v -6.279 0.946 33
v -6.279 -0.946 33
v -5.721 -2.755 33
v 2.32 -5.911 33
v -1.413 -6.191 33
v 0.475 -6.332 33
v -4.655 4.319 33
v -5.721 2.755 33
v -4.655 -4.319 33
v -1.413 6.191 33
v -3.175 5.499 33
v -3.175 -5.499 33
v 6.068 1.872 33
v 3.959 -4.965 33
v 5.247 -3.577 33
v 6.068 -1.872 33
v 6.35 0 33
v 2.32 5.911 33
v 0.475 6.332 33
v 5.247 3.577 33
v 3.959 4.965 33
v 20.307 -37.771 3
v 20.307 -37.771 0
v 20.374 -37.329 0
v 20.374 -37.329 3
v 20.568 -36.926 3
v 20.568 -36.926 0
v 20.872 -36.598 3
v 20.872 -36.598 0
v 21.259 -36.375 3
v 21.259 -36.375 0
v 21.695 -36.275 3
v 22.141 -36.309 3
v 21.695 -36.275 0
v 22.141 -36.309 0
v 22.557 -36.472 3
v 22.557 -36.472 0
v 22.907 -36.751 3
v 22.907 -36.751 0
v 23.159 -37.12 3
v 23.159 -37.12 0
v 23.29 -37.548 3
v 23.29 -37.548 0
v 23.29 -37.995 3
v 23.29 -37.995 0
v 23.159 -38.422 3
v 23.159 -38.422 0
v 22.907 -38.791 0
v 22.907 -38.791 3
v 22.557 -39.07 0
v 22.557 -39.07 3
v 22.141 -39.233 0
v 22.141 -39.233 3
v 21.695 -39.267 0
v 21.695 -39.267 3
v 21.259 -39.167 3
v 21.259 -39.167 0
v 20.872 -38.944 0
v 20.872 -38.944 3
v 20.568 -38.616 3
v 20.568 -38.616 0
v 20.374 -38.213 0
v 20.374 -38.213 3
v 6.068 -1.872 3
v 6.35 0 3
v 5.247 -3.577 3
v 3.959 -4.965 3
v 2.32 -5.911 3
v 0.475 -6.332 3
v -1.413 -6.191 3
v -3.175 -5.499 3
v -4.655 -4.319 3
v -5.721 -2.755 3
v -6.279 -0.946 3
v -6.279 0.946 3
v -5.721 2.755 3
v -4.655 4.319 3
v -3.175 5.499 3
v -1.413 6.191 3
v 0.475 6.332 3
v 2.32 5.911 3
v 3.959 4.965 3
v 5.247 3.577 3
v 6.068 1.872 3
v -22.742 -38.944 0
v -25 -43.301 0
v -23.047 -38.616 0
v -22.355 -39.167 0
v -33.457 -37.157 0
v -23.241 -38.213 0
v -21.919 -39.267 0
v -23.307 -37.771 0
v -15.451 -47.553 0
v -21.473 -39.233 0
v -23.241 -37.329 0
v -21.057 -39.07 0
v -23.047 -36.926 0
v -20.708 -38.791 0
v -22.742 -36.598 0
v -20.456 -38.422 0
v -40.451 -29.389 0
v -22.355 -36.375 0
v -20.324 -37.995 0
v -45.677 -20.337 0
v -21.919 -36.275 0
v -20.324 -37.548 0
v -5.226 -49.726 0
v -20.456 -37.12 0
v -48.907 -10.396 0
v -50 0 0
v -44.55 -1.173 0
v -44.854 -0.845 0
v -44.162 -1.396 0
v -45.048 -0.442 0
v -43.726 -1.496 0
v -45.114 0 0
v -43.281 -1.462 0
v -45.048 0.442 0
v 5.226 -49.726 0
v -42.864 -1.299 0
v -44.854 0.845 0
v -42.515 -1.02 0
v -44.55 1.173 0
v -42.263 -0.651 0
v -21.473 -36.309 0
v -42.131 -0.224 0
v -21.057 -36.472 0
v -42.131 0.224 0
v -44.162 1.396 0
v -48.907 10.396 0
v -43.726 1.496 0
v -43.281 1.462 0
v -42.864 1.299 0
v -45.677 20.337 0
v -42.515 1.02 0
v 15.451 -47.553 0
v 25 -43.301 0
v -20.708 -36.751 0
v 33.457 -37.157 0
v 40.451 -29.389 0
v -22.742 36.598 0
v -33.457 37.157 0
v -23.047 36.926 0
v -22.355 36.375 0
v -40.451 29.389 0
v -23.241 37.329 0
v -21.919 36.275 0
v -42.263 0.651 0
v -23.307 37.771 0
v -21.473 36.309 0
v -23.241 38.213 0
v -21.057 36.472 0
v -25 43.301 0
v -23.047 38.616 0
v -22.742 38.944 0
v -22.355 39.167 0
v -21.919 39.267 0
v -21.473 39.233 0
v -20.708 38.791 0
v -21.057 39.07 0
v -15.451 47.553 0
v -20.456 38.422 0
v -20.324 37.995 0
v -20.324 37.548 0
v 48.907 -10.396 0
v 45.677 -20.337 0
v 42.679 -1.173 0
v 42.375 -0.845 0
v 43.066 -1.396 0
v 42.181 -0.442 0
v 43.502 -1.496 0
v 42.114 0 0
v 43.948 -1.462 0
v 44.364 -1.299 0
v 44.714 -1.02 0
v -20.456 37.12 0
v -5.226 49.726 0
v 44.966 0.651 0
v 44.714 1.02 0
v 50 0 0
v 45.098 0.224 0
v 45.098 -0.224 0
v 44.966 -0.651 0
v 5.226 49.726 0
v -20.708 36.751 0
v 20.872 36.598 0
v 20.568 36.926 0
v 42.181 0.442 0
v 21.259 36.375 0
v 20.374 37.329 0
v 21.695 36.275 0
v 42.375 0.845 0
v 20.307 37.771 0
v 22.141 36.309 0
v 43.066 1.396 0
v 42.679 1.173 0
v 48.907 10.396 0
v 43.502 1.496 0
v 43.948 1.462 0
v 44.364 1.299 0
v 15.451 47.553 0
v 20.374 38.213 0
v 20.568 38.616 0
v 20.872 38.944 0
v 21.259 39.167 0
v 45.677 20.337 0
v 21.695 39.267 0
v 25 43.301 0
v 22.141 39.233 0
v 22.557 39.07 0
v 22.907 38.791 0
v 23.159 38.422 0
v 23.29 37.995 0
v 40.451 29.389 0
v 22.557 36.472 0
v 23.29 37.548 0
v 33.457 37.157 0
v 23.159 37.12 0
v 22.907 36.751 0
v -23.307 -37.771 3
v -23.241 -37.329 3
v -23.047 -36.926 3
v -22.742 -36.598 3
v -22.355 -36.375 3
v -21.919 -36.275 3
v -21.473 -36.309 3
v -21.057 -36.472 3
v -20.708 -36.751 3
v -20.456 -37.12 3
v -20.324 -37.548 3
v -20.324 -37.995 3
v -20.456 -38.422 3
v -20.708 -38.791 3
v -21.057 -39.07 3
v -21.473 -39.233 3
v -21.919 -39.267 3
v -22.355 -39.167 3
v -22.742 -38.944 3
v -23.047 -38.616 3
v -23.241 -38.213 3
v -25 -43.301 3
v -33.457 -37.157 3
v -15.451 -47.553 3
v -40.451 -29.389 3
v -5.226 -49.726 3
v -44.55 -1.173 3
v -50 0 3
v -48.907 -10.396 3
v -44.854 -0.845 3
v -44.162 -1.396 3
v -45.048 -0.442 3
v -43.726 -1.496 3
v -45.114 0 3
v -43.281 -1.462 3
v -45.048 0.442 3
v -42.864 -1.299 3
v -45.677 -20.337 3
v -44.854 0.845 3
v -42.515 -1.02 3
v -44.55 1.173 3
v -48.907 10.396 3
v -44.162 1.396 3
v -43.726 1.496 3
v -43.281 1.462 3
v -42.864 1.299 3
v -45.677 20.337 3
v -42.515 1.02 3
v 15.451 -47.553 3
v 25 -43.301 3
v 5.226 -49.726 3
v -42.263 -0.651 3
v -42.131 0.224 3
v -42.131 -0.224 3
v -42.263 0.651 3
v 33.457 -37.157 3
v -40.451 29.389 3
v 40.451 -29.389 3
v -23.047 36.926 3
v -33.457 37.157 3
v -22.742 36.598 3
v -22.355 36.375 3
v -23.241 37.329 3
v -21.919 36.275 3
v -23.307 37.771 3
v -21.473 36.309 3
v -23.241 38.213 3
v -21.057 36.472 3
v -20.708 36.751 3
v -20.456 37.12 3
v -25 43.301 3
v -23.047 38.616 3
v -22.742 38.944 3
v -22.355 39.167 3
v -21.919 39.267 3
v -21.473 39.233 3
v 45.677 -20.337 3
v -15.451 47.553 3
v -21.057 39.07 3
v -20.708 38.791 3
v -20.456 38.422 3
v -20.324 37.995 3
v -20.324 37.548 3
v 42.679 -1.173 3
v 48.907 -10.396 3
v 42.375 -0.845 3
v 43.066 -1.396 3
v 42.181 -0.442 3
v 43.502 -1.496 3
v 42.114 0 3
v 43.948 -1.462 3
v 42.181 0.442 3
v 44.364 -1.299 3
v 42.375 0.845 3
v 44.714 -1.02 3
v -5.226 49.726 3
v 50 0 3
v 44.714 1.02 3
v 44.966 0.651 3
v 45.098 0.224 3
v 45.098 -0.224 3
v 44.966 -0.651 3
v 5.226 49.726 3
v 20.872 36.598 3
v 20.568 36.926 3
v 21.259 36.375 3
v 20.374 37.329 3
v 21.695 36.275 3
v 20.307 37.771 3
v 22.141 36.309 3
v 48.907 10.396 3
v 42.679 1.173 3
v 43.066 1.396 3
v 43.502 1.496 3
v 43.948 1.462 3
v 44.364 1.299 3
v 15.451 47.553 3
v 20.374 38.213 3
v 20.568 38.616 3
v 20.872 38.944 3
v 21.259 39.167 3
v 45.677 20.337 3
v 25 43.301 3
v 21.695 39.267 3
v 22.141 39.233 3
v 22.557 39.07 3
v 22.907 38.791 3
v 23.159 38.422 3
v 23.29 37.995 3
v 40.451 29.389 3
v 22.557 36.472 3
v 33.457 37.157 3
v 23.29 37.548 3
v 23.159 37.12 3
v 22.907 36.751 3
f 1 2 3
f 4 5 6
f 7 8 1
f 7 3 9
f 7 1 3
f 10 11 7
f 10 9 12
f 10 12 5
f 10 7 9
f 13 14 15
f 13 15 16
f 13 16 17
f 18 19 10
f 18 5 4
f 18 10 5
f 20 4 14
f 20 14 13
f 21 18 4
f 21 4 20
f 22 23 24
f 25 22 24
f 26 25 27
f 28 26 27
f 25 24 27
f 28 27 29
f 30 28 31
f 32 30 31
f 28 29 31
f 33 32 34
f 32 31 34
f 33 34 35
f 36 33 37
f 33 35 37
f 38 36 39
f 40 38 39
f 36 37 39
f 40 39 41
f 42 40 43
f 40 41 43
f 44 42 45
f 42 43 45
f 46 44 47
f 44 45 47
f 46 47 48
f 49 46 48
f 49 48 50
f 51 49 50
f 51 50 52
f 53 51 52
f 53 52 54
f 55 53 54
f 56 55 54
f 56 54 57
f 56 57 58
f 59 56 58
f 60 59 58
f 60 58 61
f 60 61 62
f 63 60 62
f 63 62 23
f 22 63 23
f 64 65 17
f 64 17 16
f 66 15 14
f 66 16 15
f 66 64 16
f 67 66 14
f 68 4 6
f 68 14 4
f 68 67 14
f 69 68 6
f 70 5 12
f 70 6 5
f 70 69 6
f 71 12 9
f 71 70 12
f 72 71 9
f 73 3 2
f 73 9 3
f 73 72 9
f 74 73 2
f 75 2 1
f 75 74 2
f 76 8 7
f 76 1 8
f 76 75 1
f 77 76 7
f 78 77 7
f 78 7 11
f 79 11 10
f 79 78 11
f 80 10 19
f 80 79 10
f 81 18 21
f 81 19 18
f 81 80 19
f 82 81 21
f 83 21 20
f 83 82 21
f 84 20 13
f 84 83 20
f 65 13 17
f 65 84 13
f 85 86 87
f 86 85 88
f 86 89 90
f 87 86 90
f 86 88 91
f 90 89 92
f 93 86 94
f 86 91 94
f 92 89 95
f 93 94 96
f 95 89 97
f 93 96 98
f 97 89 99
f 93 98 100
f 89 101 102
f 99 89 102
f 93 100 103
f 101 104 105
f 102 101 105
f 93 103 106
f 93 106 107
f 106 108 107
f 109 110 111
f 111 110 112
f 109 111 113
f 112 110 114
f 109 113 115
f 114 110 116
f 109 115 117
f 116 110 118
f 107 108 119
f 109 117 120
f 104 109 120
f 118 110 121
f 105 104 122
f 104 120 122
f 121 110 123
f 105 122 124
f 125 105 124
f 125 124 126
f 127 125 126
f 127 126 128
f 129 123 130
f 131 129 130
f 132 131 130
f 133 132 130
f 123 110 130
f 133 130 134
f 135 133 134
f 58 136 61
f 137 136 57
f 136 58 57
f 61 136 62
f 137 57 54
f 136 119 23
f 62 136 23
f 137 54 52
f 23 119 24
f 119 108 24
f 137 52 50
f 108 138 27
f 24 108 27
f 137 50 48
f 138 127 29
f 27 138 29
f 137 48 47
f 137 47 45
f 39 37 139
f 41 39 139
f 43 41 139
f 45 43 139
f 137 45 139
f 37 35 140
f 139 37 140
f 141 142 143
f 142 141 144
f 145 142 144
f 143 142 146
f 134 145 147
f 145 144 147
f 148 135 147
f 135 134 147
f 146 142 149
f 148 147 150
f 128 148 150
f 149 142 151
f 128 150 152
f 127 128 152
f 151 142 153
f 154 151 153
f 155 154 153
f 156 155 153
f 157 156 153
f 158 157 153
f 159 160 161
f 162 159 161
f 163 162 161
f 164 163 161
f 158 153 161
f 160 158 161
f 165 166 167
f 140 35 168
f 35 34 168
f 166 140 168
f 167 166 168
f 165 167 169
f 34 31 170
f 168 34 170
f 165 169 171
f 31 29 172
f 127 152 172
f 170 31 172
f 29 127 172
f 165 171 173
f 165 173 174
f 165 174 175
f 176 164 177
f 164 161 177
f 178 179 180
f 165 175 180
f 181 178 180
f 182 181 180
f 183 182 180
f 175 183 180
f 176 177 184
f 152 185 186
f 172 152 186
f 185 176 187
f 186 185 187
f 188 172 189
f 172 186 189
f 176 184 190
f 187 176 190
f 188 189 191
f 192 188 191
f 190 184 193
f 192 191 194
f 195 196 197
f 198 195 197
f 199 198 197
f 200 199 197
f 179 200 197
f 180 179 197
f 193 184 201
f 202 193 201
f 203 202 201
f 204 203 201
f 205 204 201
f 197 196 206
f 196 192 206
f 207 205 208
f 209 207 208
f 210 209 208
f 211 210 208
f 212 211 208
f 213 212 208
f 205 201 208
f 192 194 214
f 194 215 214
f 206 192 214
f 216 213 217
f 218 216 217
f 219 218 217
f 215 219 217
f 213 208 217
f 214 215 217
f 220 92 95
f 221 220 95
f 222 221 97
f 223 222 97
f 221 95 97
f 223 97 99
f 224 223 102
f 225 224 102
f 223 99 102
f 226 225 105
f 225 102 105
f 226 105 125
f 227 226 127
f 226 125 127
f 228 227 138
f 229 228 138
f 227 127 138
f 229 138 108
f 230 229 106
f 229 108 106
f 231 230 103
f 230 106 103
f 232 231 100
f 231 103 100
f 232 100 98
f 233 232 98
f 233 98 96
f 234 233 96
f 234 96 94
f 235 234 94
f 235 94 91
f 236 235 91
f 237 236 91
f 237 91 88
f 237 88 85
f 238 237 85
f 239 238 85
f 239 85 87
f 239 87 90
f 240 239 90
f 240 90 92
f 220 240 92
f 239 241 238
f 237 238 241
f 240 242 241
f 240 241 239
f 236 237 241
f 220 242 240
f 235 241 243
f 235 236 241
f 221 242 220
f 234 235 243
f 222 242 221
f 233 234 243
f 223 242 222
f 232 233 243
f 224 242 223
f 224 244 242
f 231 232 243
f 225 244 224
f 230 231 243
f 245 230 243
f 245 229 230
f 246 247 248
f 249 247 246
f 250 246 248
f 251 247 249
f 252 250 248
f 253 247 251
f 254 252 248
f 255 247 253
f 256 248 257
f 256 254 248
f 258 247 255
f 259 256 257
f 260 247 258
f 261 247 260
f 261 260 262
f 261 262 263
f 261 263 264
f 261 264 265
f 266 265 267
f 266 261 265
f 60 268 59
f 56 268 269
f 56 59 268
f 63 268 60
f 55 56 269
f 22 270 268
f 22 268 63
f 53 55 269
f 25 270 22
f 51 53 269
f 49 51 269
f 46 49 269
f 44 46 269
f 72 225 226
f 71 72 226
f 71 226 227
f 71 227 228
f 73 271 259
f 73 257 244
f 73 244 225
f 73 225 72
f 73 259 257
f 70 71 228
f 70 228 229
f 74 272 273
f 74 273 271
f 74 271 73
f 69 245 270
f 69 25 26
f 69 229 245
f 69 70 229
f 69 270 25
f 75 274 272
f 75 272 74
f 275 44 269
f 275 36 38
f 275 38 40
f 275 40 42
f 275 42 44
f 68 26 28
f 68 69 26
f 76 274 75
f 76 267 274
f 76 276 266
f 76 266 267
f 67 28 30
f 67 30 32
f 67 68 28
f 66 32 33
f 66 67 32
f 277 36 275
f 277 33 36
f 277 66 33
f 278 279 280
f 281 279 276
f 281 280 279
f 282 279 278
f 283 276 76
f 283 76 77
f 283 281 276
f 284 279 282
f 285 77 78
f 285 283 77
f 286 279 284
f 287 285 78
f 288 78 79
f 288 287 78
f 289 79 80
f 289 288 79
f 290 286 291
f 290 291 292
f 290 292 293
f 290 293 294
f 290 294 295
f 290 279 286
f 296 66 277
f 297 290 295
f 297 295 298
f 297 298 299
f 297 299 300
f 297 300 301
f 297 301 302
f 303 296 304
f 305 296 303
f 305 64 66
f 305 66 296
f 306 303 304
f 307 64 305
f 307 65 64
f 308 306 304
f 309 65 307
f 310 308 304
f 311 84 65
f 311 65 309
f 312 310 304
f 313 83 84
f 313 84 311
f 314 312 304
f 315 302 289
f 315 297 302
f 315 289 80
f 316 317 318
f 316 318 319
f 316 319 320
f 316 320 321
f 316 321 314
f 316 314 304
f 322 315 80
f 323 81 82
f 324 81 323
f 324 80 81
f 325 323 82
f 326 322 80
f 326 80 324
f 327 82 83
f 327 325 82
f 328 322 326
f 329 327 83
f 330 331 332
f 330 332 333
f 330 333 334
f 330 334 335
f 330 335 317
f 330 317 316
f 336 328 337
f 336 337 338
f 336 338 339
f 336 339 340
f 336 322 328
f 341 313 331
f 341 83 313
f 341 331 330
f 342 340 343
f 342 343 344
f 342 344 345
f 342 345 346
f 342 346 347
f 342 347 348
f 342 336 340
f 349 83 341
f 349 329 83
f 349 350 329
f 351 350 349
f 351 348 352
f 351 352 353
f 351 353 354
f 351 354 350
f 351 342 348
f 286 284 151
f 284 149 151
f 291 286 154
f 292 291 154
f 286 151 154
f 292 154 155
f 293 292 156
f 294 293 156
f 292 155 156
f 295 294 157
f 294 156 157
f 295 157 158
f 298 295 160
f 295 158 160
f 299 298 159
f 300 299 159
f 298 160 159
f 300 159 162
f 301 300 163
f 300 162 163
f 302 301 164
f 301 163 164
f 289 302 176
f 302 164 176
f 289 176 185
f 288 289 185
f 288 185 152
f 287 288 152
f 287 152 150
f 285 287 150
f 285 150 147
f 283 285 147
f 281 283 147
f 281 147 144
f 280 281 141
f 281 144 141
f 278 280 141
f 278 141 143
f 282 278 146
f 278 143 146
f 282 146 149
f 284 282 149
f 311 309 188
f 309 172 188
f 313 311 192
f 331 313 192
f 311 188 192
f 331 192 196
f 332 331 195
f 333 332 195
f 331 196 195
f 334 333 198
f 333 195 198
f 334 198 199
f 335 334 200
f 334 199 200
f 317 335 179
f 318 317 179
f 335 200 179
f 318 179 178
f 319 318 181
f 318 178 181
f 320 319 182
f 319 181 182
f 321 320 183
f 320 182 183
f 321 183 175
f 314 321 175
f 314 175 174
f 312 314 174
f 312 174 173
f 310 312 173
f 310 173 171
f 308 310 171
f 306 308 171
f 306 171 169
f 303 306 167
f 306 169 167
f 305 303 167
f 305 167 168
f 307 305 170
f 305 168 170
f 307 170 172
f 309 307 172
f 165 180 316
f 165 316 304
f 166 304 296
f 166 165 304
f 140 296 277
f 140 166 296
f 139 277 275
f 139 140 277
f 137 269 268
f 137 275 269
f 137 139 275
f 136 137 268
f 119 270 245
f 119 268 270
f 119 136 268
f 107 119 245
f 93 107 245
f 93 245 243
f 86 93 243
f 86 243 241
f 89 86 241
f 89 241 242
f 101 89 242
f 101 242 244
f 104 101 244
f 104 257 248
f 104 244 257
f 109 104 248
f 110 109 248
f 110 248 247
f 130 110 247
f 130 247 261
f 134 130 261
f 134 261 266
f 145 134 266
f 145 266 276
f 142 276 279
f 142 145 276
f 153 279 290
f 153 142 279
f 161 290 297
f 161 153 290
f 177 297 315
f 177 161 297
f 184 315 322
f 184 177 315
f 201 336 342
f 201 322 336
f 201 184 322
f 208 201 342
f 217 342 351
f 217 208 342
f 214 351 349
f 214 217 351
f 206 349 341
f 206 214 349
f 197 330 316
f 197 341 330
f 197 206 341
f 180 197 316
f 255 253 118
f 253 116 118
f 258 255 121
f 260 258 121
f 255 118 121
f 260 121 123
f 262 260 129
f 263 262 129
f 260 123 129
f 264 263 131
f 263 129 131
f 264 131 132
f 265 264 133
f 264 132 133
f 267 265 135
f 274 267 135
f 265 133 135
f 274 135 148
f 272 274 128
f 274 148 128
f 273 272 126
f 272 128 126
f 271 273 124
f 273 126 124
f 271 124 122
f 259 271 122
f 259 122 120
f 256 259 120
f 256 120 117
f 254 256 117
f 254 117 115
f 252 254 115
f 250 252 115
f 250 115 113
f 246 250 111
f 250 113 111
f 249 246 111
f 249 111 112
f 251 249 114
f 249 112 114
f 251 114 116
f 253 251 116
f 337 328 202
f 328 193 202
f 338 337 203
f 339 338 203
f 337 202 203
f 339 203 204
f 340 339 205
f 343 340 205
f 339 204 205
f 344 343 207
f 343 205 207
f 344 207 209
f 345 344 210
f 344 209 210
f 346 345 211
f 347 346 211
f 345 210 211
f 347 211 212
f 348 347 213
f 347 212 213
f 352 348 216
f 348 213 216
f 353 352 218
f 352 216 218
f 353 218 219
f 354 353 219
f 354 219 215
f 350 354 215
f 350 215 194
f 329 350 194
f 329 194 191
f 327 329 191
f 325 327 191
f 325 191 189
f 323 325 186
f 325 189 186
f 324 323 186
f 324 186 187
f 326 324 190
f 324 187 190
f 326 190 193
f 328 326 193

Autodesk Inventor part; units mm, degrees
ref_plane "YZ Plane" through (0, 0, 0) normal (1, 0, 0) x (0, 1, 0)
ref_plane "XZ Plane" through (0, 0, 0) normal (0, 1, 0) x (-1, 0, 0)
ref_plane "XY Plane" through (0, 0, 0) normal (0, 0, 1) x (1, 0, 0)
sketch "Sketch1" plane through (0, 0, 0) normal (0, 0, 1) x (1, 0, 0)
  circle A0 centre (0, 0) radius 50
  dimension "d0" = 100
extrude "Extrusion1" add sketch "Sketch1" along normal blind 3
sketch "Sketch2" plane through (0, 0, 3) normal (0, 0, 1) x (1, 0, 0)
  circle A0 centre (0, 0) radius 6.35
  dimension "d3" = 12.7
extrude "Extrusion2" add sketch "Sketch2" along normal blind 30
sketch "Sketch3" plane through (0, 0, 0) normal (0, 0, -1) x (-1, 0, 0)
  circle A0 centre (43.6143, 0) radius 1.5
  circle A1 centre (21.8072, -37.7711) radius 1.5
  circle A2 centre (-21.8072, -37.7711) radius 1.5
  circle A3 centre (-43.6143, 0) radius 1.5
  circle A4 centre (-21.8072, 37.7711) radius 1.5
  circle A5 centre (21.8072, 37.7711) radius 1.5
  point P0 (0, 0)
  dimension "d6" = 3
  dimension "d9" = 360
extrude "Extrusion3" cut sketch "Sketch3" against normal through all
properties part number "Center Lower Disk"
